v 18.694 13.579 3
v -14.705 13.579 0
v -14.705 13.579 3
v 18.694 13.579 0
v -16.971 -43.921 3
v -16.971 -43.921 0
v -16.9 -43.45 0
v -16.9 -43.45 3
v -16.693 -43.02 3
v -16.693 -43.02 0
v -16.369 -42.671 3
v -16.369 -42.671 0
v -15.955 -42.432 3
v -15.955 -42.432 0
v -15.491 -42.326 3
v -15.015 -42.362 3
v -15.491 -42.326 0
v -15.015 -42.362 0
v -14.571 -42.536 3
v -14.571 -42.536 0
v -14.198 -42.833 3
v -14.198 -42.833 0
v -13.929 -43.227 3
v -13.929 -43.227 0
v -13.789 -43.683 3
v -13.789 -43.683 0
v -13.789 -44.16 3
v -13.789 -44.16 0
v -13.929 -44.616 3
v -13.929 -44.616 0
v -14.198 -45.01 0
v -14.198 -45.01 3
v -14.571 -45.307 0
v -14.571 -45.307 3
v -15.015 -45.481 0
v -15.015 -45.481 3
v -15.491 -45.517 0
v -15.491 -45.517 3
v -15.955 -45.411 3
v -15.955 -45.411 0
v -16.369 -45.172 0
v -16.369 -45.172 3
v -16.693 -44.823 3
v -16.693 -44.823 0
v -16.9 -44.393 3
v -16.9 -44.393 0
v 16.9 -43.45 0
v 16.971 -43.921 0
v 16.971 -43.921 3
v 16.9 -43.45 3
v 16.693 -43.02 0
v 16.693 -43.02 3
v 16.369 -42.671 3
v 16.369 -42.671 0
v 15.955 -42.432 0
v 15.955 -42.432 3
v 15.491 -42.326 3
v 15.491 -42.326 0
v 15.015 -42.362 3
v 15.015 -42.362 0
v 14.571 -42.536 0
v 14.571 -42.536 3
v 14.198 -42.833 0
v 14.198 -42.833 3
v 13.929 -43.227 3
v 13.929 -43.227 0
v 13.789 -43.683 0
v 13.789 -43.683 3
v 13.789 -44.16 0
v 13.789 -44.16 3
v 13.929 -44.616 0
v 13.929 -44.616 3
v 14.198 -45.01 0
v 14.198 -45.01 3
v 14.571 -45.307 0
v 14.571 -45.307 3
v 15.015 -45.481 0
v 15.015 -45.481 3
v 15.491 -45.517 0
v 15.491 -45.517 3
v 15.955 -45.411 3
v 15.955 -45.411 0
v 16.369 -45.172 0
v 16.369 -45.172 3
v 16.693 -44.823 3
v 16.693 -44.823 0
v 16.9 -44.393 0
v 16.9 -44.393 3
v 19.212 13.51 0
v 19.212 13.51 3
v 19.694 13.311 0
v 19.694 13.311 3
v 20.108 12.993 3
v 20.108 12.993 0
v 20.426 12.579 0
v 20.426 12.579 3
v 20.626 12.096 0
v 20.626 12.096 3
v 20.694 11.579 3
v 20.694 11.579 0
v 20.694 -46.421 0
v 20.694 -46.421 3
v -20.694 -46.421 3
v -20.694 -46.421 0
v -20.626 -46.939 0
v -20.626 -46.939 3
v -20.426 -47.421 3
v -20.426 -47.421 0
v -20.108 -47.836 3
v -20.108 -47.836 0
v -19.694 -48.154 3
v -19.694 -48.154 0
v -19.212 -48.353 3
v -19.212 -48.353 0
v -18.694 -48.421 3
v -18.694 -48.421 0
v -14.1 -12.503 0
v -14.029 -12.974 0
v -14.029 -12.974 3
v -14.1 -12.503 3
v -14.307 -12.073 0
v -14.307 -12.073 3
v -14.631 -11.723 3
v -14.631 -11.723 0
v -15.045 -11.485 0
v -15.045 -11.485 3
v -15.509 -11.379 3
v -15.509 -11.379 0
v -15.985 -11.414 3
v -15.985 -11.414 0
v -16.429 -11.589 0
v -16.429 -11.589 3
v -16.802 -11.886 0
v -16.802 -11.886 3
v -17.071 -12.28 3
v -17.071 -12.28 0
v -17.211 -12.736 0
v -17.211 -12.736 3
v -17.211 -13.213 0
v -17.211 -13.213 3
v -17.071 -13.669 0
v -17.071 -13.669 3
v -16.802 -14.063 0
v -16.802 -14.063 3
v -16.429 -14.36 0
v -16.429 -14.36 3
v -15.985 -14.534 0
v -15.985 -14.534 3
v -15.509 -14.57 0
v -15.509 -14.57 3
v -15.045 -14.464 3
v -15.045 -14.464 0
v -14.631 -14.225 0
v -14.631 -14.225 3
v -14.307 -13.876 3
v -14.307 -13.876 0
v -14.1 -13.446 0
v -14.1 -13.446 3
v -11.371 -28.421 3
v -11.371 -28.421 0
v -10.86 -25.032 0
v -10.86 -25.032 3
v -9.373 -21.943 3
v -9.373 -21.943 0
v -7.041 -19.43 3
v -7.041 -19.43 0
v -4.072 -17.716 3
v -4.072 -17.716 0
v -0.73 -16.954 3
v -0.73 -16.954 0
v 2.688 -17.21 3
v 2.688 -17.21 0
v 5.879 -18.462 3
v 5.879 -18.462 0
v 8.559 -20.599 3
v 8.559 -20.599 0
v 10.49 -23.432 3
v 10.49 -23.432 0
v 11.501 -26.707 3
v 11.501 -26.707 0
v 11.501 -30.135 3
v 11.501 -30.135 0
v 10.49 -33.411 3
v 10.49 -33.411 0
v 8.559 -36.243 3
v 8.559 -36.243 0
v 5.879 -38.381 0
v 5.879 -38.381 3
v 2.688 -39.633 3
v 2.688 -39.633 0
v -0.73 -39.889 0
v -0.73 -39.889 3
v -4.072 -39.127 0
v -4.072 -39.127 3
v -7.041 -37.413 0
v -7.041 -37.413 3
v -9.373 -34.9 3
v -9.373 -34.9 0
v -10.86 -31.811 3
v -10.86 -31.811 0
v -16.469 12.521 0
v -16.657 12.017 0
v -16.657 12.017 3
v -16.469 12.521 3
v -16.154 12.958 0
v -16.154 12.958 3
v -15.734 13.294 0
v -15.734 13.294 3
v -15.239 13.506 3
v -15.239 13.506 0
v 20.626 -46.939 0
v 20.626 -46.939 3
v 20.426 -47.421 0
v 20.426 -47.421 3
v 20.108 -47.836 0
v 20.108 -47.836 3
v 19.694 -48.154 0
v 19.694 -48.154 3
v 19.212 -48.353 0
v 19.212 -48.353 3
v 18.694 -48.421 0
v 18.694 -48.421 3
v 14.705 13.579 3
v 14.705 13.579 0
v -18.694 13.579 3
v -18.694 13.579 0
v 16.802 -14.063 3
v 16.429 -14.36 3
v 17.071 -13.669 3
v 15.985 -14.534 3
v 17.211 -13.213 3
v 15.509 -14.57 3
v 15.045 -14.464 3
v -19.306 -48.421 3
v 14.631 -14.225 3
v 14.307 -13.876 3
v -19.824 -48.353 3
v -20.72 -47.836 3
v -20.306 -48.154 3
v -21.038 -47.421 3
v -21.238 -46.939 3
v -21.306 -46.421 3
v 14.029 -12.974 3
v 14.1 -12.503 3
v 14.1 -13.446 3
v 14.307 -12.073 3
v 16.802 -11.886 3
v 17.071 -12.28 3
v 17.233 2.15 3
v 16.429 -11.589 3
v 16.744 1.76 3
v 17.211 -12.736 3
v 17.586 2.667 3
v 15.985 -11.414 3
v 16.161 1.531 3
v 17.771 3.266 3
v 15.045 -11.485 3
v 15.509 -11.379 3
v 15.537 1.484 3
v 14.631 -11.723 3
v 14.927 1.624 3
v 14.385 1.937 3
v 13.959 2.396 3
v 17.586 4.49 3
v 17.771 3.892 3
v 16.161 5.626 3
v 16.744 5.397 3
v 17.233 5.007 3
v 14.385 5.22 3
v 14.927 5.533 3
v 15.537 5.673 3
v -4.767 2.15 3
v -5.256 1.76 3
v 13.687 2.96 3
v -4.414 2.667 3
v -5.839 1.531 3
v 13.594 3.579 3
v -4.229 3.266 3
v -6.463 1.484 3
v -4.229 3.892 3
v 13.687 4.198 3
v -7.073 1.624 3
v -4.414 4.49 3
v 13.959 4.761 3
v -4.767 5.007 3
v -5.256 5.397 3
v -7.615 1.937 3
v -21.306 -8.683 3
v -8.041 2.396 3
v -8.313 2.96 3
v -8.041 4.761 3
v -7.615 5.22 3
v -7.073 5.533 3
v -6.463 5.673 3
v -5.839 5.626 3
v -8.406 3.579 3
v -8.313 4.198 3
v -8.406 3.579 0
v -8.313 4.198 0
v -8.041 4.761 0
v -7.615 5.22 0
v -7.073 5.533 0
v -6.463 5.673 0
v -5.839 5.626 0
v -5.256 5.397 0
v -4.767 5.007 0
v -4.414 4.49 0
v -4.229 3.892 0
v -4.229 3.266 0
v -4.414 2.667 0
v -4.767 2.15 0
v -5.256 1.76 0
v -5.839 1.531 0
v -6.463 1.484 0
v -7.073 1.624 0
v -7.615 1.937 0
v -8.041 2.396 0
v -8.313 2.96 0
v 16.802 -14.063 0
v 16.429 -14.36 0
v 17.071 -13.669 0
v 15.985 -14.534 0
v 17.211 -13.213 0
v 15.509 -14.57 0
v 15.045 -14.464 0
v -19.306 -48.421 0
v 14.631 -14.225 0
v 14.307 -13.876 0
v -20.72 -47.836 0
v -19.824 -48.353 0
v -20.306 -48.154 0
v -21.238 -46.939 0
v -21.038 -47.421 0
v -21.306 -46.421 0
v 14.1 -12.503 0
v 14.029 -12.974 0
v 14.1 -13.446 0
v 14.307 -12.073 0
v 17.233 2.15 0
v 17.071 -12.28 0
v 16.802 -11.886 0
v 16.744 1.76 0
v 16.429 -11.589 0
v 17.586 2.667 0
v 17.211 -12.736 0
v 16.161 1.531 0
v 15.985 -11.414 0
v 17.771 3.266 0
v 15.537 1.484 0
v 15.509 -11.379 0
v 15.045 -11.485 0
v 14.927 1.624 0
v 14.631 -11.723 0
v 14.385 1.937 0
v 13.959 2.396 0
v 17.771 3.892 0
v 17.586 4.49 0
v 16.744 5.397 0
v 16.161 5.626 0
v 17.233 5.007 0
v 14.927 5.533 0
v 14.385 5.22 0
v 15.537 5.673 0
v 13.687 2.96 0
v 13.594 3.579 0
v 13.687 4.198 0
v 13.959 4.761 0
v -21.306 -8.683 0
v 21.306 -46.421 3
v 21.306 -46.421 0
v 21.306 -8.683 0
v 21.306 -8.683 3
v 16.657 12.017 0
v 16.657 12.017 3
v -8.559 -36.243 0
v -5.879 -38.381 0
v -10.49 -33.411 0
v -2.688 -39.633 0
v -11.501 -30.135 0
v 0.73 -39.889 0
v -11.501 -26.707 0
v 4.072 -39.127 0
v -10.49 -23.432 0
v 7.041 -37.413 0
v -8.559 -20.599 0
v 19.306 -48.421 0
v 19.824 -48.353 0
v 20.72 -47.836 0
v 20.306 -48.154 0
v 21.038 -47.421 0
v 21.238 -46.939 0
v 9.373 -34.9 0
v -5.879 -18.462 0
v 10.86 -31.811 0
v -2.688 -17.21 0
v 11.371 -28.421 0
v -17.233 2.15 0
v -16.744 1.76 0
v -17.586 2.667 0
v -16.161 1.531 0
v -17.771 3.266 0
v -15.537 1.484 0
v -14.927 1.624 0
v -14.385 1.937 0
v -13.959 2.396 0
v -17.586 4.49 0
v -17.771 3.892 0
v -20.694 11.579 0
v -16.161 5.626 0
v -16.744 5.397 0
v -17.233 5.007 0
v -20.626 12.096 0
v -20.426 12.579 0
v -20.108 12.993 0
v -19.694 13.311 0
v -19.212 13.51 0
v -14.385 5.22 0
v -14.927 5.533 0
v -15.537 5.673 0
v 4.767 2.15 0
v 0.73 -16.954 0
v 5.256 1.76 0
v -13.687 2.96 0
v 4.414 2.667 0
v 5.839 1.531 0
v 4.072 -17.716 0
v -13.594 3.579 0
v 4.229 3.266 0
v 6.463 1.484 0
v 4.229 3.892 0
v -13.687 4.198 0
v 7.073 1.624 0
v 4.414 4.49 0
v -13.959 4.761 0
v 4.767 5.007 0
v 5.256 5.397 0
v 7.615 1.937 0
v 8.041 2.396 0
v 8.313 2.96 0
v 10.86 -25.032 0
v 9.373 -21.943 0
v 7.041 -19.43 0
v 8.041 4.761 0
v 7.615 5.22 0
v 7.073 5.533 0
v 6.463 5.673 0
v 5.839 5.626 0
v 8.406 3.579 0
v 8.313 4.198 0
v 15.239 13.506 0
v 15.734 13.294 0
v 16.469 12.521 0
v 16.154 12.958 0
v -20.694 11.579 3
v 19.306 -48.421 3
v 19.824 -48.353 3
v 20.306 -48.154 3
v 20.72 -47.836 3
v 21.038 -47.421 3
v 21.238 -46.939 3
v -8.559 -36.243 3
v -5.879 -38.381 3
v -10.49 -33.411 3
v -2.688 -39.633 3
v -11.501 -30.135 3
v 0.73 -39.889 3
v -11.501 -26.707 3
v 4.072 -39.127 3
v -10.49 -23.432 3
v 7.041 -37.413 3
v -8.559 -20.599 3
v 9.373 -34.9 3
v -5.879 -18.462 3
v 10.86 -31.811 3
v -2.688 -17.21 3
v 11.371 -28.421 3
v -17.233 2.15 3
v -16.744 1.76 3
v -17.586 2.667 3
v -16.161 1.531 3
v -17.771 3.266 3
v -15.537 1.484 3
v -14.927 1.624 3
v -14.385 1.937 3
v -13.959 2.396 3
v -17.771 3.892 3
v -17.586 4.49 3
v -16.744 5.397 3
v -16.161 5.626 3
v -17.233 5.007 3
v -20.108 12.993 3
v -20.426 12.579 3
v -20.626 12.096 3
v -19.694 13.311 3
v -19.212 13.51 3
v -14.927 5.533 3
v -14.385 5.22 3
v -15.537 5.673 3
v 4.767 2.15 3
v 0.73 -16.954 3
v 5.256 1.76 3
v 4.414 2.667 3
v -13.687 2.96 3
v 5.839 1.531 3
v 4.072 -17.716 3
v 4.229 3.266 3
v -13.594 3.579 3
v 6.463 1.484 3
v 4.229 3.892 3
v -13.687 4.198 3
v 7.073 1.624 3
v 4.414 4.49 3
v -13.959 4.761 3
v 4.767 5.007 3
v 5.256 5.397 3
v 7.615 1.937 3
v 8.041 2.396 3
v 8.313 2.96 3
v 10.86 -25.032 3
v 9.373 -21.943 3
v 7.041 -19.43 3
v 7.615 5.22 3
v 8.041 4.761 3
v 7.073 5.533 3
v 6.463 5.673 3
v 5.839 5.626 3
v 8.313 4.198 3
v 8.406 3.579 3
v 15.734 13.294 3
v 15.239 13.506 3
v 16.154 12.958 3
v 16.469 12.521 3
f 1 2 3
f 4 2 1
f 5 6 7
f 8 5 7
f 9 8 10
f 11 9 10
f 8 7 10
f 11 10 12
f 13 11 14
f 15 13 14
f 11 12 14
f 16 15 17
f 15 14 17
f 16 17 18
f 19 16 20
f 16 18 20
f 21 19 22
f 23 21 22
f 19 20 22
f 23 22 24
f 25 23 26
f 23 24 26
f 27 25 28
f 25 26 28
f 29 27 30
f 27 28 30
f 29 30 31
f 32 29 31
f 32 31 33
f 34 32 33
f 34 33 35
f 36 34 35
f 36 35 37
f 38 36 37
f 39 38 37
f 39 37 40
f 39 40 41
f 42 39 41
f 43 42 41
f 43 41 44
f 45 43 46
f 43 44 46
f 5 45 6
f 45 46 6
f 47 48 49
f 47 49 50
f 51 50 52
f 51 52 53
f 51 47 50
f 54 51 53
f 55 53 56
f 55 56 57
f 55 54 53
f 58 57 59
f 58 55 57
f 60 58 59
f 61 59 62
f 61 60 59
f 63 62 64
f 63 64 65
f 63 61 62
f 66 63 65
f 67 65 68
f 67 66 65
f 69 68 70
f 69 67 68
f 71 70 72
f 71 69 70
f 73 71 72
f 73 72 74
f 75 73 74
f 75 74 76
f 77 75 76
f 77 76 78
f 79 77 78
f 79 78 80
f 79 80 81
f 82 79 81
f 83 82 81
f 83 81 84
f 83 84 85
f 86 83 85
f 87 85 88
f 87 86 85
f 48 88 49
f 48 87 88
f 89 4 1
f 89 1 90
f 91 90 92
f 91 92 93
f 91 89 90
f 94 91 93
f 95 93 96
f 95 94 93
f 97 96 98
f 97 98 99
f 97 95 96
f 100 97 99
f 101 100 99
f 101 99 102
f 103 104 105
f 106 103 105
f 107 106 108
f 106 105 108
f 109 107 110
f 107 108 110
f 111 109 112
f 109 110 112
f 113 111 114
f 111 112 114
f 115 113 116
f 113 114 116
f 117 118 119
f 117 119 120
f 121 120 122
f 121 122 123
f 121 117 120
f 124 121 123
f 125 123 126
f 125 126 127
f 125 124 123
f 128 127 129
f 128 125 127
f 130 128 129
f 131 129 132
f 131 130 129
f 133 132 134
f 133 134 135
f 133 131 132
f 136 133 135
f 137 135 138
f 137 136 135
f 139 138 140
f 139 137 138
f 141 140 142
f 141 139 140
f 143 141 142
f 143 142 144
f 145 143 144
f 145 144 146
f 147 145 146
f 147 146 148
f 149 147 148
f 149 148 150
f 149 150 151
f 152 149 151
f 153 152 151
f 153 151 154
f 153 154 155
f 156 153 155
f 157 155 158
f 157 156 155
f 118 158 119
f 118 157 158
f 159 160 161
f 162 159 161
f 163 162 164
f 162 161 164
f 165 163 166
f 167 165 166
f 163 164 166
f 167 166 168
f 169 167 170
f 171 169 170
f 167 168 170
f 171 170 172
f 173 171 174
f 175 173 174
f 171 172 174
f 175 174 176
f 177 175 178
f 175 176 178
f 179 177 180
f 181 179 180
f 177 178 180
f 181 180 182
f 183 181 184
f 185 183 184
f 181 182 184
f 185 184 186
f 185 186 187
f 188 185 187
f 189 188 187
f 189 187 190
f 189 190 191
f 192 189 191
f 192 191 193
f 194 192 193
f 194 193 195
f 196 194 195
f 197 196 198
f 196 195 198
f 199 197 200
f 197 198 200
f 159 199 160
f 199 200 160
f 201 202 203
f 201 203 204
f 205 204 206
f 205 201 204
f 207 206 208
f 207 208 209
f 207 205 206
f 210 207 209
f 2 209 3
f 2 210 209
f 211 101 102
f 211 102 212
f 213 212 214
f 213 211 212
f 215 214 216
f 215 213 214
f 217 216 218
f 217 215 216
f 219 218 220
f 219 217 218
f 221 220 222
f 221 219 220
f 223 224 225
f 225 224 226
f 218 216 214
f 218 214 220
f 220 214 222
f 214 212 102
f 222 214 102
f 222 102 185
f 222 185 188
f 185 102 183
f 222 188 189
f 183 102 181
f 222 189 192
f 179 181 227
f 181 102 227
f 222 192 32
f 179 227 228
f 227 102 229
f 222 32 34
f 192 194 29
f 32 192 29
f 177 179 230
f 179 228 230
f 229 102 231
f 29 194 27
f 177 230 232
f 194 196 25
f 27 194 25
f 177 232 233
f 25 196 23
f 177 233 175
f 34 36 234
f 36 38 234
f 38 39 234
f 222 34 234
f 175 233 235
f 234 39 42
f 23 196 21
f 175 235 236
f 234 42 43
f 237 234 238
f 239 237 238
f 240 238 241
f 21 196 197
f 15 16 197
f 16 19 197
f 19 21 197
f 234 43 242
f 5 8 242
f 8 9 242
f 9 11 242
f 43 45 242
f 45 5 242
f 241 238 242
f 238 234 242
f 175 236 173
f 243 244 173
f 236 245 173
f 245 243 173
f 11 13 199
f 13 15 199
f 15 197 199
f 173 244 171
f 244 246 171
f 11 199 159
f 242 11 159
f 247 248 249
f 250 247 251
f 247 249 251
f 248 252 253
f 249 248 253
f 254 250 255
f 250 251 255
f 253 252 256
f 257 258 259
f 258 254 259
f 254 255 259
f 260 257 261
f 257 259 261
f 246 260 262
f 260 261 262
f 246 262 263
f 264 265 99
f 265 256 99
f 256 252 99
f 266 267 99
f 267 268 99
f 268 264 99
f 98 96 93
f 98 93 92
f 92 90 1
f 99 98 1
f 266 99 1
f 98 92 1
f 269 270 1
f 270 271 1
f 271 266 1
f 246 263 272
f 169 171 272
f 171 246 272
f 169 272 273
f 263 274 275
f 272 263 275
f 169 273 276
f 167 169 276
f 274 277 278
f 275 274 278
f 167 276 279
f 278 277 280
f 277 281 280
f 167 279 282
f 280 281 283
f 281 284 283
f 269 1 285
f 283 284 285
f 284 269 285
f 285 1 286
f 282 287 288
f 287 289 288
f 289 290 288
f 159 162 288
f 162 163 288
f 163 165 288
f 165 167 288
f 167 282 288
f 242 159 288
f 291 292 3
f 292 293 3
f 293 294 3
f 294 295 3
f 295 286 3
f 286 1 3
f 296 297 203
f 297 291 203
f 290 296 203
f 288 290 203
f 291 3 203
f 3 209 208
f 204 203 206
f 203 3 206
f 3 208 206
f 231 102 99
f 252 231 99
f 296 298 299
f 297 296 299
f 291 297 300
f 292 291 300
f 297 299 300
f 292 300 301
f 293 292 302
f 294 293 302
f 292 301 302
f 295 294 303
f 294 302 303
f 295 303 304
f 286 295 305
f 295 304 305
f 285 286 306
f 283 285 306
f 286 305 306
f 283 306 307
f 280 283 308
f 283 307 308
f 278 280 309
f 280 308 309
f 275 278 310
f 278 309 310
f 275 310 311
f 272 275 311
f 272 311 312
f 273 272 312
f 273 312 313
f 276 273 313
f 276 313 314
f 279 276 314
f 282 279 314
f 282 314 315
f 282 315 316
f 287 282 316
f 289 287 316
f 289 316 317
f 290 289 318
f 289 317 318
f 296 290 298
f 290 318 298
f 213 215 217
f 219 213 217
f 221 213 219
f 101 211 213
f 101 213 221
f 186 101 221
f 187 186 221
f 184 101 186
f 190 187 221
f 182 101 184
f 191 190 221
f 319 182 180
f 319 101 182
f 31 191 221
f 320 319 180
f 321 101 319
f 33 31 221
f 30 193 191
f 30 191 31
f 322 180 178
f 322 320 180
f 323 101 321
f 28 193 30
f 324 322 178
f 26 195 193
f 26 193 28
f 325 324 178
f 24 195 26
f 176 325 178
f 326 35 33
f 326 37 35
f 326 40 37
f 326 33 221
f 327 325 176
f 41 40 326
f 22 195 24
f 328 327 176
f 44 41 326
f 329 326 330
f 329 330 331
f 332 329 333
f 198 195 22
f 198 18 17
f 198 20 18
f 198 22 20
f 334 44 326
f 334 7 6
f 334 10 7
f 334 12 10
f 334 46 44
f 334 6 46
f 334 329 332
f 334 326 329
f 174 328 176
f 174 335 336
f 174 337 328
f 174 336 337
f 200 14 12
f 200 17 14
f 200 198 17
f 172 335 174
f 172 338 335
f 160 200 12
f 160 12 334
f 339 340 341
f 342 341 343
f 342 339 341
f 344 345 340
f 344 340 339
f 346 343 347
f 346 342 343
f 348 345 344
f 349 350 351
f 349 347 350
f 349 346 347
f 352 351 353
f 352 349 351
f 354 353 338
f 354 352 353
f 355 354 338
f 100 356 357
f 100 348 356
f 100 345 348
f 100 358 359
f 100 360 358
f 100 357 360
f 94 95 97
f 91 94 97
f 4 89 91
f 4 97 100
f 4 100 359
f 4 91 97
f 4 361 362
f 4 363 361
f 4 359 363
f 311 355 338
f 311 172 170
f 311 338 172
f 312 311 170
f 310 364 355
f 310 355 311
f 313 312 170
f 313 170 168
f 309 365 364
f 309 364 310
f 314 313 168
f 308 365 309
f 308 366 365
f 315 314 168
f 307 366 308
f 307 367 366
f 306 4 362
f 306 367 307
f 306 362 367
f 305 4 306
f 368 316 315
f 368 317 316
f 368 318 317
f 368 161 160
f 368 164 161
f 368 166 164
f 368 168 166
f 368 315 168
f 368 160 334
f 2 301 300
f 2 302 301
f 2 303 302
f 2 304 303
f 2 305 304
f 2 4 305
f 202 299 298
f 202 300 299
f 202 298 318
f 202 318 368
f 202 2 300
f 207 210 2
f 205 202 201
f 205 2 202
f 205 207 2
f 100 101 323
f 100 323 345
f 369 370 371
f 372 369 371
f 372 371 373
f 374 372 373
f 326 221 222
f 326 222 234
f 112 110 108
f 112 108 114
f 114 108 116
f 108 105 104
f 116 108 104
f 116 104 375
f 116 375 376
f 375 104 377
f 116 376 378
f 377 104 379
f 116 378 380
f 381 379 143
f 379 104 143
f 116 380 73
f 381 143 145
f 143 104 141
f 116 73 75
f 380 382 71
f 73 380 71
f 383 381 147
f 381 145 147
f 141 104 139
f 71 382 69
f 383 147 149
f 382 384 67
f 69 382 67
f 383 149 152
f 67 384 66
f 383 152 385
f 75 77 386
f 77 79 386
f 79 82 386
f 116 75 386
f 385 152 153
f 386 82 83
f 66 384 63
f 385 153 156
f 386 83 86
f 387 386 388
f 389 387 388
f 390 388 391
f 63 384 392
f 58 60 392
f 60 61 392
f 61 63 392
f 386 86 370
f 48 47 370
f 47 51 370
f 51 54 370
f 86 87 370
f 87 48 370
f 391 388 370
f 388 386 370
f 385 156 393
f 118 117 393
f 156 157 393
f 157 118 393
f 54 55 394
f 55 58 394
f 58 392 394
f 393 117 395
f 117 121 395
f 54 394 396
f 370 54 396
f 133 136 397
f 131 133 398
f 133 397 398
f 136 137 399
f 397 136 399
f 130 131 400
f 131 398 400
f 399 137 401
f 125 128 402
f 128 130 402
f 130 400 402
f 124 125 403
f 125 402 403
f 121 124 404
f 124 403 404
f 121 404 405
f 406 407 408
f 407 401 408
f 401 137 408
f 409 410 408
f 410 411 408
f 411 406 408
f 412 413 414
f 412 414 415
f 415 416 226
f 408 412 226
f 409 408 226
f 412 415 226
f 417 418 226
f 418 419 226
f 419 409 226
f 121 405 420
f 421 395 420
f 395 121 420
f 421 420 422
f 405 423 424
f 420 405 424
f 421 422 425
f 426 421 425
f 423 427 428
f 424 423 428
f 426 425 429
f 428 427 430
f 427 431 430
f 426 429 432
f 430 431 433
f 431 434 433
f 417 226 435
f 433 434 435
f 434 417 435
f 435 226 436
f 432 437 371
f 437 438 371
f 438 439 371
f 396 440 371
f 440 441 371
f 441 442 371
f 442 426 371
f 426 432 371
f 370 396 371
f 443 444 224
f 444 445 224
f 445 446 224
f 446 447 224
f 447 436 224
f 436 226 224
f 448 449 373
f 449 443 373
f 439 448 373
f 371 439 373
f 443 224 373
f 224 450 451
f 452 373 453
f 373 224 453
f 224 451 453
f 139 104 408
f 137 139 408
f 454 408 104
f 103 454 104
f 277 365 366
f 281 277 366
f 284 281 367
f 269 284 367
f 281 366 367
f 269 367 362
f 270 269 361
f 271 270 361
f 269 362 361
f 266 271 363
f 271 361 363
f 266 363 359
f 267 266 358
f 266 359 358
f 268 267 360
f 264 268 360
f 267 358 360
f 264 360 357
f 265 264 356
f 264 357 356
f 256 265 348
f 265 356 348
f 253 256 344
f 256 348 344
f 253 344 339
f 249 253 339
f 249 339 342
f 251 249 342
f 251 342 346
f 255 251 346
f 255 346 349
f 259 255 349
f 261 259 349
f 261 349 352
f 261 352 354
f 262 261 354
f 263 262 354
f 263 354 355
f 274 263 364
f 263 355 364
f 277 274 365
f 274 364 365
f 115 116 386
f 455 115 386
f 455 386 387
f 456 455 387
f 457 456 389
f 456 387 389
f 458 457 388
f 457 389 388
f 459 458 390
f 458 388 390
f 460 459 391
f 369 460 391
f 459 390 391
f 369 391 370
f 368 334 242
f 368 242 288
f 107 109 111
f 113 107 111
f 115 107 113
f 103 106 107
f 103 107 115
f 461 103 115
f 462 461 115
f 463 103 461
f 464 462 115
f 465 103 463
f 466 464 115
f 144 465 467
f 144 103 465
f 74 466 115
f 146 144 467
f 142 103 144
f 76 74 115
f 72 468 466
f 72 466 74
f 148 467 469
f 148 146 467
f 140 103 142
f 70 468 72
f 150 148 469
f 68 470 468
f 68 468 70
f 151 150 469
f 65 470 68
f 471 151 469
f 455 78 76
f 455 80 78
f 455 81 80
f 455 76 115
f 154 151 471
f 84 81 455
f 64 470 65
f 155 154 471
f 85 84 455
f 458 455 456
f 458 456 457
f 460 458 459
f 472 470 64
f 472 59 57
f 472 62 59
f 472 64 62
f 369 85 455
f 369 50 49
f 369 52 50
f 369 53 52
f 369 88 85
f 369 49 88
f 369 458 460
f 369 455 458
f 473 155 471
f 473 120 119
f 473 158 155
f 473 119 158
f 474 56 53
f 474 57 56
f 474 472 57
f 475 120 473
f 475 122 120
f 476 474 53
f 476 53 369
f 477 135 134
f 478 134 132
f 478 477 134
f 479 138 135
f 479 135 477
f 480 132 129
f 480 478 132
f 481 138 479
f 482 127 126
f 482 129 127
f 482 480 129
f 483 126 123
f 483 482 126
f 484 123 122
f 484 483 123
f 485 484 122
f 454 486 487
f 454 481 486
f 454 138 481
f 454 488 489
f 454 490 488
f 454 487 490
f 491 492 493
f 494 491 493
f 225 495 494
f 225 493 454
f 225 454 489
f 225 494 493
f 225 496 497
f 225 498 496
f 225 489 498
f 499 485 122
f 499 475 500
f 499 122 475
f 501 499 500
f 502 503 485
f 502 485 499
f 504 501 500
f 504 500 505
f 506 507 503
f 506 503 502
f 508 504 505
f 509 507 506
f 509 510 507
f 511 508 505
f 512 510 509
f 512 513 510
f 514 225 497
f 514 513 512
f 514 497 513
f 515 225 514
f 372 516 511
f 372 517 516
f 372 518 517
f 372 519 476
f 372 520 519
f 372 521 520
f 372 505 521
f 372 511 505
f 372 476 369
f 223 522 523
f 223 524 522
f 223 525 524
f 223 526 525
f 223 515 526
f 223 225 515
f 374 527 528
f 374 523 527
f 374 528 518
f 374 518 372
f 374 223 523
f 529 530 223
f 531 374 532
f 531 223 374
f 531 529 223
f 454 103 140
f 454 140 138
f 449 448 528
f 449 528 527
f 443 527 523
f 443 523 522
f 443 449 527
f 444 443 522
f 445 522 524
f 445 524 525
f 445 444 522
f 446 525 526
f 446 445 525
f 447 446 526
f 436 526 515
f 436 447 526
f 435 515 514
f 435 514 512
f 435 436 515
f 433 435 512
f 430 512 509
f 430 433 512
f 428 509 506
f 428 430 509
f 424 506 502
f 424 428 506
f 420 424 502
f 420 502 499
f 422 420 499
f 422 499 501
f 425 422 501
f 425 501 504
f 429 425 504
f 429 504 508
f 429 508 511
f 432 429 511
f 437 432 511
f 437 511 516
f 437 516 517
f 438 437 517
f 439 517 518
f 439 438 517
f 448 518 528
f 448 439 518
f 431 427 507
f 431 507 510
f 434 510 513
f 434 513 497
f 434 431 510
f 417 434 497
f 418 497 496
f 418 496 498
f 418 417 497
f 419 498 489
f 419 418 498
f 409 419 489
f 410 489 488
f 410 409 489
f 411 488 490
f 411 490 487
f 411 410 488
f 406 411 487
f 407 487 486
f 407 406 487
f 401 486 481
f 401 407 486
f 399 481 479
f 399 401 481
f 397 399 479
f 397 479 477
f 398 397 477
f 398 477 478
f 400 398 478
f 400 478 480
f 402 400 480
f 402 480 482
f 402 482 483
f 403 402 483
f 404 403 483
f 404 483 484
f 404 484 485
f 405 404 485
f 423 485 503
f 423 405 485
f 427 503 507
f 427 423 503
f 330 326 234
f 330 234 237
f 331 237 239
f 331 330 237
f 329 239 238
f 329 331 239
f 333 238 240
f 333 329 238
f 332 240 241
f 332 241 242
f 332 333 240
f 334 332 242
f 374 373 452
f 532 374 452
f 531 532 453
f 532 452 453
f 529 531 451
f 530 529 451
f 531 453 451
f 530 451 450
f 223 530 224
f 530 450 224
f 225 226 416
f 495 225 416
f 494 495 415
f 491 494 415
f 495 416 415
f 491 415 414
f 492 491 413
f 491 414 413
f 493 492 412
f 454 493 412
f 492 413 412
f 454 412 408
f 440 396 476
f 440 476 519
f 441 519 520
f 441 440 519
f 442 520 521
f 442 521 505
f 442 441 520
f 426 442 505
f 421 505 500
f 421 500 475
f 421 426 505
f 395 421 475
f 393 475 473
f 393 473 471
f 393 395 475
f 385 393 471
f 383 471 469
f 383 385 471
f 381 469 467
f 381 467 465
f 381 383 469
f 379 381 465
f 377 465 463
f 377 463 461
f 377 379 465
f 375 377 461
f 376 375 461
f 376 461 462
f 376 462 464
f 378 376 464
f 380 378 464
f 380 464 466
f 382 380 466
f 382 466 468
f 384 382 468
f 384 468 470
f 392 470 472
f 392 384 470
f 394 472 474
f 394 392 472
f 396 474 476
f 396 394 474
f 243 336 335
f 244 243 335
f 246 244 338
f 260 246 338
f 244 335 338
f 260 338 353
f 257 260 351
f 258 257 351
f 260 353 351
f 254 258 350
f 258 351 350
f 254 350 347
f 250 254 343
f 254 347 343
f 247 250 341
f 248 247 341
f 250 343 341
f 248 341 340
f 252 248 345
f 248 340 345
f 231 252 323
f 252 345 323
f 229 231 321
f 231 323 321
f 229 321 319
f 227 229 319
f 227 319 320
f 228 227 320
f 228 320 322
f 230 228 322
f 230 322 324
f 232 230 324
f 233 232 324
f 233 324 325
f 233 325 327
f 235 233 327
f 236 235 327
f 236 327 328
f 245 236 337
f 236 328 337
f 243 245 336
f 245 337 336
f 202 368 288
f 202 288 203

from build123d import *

# Parameters (mm, degrees)
F0_R     = 11.5
F0_R_2   = 1.6
F0_R_3   = 2.1
F1_DEPTH = 3


with BuildPart() as f1:
    # F0 (on Top) → F1 (new body)
    with BuildSketch(Plane.XY):
        with BuildLine():
            Line((14.705361, 13.578521), (-18.694024, 13.578521))
            ThreePointArc((-18.694024, 13.578521), (-20.108237, 12.992735), (-20.694024, 11.578521))
            Line((-20.694024, 11.578521), (-20.694024, -46.421479))
            ThreePointArc((-20.694024, -46.421479), (-20.108237, -47.835692), (-18.694024, -48.421479))
            Line((-18.694024, -48.421479), (19.305976, -48.421479))
            ThreePointArc((19.305976, -48.421479), (20.72019, -47.835692), (21.305976, -46.421479))
            Line((21.305976, -46.421479), (21.305976, -8.682704))
            Line((21.305976, -8.682704), (16.656745, 12.016813))
            ThreePointArc((16.656745, 12.016813), (15.955044, 13.140024), (14.705361, 13.578521))
        make_face()
        with Locations((-0.129063, -28.421479)):
            Circle(F0_R, mode=Mode.SUBTRACT)
        with Locations((15.370937, -43.921479)):
            Circle(F0_R_2, mode=Mode.SUBTRACT)
        with Locations((-15.629063, -12.974368)):
            Circle(F0_R_2, mode=Mode.SUBTRACT)
        with Locations((-15.694024, 3.578521)):
            Circle(F0_R_3, mode=Mode.SUBTRACT)
        with Locations((6.305976, 3.578521)):
            Circle(F0_R_3, mode=Mode.SUBTRACT)
    extrude(amount=F1_DEPTH)


with BuildPart() as f2_1:
    # F2: instance of F1
    add(f1.part.mirror(Plane.YZ))


solid = Compound([f1.part, f2_1.part])
